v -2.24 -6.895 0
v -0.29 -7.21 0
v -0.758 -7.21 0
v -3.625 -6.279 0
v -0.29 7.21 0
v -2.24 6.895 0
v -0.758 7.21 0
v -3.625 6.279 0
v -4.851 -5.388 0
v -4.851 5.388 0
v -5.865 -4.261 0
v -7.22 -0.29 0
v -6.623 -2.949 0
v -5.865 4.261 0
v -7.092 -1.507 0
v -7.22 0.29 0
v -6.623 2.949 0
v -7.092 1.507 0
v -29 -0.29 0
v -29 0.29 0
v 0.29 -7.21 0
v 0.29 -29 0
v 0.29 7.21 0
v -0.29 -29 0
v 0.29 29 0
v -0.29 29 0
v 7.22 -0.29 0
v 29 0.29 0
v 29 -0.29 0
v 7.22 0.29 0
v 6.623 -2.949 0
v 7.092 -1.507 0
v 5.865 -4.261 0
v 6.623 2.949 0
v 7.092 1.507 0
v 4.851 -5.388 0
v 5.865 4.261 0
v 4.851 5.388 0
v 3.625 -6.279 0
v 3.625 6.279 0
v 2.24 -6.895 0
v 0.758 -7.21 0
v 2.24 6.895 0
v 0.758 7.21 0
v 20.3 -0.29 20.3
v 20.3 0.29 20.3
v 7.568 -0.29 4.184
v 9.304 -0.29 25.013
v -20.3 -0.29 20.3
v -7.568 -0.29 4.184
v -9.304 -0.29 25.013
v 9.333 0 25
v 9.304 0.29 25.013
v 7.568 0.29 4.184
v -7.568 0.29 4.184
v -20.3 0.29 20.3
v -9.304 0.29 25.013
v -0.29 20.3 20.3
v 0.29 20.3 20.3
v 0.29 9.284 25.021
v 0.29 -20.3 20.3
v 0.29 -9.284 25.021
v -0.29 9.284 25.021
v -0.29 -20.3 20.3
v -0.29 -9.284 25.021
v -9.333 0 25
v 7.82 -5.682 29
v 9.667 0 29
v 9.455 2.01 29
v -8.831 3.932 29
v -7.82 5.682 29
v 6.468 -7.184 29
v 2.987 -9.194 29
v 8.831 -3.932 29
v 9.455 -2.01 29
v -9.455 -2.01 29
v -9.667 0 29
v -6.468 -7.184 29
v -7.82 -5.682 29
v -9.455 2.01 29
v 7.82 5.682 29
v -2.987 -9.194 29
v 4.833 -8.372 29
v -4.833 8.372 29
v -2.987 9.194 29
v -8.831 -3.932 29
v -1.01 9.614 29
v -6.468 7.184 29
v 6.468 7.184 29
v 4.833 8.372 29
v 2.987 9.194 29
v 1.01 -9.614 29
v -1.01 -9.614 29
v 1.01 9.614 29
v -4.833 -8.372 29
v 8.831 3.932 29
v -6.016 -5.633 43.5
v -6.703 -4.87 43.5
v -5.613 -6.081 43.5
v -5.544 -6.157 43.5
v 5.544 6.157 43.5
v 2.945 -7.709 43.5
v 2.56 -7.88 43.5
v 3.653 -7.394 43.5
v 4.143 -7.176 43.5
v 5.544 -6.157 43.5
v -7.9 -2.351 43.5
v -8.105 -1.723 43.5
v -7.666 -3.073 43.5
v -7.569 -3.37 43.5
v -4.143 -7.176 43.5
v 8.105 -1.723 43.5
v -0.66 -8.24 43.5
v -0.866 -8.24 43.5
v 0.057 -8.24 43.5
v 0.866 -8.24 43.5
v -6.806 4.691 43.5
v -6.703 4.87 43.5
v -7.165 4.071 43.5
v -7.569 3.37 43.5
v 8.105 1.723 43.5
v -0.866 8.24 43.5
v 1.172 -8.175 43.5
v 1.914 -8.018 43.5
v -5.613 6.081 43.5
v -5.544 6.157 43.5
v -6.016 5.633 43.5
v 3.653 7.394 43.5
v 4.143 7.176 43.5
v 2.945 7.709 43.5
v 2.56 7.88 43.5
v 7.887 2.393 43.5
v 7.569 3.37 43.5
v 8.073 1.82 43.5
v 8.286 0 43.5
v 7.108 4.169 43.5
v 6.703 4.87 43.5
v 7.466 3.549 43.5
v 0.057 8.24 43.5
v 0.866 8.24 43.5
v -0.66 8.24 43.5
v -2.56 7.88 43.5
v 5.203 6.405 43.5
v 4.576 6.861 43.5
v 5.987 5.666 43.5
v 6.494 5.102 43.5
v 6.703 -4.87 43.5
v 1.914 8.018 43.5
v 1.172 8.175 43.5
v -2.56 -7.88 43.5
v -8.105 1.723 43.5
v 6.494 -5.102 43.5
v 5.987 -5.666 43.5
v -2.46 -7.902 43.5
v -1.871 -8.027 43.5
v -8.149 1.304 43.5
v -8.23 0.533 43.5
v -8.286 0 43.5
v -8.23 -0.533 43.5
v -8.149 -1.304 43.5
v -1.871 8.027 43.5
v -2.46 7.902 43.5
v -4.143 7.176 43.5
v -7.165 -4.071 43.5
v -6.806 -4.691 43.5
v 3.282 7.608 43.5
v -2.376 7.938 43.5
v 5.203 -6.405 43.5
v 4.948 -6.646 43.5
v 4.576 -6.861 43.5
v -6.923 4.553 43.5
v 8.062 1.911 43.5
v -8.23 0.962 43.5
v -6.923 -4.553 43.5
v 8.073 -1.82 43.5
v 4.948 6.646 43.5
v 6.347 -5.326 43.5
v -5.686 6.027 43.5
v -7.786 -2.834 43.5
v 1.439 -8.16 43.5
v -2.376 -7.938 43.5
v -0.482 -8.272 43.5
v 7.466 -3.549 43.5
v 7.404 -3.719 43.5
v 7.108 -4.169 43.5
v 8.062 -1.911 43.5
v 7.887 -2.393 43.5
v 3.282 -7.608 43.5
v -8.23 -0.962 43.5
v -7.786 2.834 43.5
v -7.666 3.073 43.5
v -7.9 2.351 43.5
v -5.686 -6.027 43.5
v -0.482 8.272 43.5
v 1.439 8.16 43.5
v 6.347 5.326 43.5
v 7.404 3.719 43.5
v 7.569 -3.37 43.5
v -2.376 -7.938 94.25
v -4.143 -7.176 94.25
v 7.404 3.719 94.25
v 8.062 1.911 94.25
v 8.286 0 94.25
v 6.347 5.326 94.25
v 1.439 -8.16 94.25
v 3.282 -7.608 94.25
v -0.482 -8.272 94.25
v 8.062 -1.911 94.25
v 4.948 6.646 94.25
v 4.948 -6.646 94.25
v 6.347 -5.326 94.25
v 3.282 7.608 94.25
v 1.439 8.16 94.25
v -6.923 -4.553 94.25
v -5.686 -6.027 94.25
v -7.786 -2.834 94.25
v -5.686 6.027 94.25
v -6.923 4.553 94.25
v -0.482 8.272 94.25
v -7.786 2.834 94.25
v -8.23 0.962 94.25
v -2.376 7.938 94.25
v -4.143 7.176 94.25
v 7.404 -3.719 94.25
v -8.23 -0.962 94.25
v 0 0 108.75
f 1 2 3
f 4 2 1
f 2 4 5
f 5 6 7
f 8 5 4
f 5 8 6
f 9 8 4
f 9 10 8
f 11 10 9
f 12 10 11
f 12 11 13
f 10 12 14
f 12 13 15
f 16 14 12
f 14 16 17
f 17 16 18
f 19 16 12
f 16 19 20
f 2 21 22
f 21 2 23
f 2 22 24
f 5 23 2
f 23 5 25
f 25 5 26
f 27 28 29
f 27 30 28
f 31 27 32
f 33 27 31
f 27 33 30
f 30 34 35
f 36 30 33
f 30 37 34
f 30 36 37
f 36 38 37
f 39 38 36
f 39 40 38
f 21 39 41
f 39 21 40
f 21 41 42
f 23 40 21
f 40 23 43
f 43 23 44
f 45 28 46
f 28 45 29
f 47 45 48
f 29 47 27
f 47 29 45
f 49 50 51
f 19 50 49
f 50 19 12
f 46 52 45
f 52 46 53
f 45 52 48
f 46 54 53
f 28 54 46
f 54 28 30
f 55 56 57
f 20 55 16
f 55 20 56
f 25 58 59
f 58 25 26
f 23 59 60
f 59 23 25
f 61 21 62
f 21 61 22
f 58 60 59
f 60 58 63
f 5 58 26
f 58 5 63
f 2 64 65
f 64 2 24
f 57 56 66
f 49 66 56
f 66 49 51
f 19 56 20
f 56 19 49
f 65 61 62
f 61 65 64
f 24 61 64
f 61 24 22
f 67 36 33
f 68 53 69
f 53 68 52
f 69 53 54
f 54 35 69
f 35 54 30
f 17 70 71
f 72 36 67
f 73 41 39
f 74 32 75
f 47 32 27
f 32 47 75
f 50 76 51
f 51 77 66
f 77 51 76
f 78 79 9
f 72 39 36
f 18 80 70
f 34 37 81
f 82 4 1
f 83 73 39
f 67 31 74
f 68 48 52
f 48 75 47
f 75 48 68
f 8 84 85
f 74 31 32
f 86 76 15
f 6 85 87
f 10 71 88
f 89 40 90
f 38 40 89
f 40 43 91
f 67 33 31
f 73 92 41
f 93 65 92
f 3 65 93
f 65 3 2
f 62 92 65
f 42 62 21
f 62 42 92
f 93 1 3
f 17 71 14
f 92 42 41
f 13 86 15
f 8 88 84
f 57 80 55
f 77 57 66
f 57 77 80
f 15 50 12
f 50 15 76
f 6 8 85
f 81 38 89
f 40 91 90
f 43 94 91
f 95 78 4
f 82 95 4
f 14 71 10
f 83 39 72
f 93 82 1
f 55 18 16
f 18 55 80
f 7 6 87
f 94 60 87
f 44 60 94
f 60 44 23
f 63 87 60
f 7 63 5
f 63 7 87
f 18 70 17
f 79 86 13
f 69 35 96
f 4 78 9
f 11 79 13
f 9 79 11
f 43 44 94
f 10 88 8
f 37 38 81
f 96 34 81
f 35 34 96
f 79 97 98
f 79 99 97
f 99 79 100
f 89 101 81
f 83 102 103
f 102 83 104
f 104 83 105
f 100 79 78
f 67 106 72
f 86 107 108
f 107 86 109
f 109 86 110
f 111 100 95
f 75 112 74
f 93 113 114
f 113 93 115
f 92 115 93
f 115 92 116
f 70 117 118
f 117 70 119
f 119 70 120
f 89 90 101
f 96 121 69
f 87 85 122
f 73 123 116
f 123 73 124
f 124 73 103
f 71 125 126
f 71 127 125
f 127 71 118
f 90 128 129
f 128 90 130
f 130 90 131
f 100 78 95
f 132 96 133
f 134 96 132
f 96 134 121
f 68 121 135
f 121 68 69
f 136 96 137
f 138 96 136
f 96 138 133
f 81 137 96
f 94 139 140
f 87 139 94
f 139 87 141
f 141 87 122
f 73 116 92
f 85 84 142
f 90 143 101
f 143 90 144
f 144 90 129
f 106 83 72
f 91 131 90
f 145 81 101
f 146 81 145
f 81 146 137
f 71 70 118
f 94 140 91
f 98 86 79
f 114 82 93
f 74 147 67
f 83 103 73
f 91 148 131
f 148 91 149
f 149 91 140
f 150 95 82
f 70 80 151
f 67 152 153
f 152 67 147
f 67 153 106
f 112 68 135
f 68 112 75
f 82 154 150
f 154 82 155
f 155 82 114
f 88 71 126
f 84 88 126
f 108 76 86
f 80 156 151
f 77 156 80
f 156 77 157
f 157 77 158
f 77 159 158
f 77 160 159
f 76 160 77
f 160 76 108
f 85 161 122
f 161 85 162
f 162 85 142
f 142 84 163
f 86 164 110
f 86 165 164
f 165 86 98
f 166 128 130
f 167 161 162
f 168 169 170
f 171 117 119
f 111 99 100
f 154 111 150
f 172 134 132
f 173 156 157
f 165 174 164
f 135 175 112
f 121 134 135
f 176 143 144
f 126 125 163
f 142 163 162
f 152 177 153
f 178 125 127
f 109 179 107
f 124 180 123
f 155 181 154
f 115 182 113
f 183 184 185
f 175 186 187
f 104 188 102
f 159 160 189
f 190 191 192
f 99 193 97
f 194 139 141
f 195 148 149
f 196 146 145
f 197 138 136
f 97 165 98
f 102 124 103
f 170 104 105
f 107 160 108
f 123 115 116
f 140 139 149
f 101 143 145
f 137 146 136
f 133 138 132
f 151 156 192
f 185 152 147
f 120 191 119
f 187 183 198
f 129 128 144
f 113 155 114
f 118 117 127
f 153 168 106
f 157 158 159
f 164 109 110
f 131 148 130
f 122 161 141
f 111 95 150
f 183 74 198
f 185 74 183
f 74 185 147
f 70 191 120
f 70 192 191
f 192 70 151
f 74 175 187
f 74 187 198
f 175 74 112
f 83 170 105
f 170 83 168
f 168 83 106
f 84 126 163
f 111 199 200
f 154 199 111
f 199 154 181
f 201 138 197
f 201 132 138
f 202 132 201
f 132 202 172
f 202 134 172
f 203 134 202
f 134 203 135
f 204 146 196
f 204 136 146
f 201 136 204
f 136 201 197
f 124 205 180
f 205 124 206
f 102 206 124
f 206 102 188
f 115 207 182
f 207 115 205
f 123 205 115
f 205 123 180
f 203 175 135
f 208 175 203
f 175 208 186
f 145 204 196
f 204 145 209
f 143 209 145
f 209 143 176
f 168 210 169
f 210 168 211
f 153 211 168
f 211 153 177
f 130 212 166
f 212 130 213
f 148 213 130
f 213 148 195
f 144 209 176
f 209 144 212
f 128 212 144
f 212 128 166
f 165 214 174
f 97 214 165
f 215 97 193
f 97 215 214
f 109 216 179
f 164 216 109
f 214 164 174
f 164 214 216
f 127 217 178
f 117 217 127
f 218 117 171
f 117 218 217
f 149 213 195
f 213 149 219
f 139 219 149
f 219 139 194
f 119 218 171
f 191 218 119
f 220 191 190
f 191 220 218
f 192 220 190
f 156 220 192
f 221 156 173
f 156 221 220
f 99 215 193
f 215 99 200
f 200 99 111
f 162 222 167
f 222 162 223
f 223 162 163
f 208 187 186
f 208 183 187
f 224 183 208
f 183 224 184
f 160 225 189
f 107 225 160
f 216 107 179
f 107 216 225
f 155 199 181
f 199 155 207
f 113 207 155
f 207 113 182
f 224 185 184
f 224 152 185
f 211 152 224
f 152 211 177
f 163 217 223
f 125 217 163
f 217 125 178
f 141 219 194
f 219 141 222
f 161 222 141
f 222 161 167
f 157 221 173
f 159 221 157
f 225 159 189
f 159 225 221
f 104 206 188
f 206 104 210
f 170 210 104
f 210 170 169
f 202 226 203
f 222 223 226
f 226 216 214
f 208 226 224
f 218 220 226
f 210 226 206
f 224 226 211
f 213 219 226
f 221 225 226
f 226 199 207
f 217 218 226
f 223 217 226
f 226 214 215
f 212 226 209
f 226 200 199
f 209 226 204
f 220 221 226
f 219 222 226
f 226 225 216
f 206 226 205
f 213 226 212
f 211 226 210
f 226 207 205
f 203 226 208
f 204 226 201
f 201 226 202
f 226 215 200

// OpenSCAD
module wing(scale=10) {
    rotate([90, 0, 0])
    linear_extrude(height = scale*0.02, center = true)
    polygon(points=[[0, 0], [0, scale], [scale*0.7, scale*0.7], [scale, 0]]);
}

module rocket(scale=10) {
    rotate([0, 0, 0])
    wing(scale);

    rotate([0, 0, 90])
    wing(scale);

    rotate([0, 0, 180])
    wing(scale);

    rotate([0, 0, 270])
    wing(scale);

    color("blue", 0.8)
    cylinder(h = scale, r1=scale/4, r2=scale/3);

    mid_height = scale/2;
    mid_width  = scale/3.5;
    translate([0, 0, scale])
    color("green",0.8)
    cylinder(h = mid_height, r1=scale/3, r2=mid_width);

    long_height = scale+mid_height;
    translate([0, 0, long_height])
    color("blue", 0.8)
    cylinder(h = scale*1.75, r1=mid_width, r2=scale/3.5);

    cone_height = scale*1.75+long_height;
    translate([0, 0, cone_height])
    color("black",0.8)
    cylinder(h = (scale/2), r1=mid_width, r2=0);

}

rocket(29);
